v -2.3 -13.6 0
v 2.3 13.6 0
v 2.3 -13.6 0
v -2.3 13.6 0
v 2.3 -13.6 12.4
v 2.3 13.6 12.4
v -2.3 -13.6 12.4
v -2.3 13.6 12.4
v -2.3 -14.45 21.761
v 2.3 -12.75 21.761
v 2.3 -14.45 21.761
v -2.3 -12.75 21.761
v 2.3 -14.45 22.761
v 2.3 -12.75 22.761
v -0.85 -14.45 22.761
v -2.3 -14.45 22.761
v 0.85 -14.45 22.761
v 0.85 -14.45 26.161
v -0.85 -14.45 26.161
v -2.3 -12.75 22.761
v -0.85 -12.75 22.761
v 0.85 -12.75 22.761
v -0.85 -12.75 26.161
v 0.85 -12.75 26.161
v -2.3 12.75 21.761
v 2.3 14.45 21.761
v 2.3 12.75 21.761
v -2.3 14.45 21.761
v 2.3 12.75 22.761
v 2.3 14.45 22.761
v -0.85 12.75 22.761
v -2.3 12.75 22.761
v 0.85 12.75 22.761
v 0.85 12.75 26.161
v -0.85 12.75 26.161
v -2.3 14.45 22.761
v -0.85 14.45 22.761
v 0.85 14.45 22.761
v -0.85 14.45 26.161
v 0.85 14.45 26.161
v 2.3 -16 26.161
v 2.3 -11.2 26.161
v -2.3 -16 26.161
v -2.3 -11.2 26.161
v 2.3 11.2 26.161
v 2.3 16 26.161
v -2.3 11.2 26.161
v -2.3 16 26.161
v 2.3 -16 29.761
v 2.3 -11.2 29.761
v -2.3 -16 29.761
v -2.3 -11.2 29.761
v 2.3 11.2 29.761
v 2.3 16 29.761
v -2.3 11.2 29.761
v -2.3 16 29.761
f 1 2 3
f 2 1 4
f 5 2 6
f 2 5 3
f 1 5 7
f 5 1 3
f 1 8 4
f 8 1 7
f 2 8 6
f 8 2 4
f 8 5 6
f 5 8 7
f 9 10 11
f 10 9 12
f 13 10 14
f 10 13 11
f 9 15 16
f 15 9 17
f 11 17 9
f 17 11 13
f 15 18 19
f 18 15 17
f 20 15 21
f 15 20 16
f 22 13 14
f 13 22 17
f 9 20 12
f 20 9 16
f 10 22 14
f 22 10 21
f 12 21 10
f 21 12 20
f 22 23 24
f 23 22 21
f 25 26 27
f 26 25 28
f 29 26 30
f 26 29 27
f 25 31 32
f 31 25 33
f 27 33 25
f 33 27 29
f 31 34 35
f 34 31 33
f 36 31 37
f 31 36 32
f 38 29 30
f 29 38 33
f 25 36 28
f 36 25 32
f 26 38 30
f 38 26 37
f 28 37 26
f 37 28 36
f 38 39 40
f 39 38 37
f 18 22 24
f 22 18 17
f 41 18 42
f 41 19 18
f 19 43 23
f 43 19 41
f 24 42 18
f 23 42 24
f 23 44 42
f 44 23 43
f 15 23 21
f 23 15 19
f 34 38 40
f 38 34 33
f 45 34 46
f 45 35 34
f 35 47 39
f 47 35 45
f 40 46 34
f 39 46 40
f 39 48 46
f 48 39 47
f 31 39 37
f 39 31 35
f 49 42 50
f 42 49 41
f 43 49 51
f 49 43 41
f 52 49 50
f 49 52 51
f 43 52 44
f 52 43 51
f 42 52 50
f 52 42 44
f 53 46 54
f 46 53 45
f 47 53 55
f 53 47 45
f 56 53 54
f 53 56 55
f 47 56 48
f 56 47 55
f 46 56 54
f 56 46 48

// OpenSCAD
// Generated by SolidPython 0.4.2 on 2020-09-29 23:20:54
//!OpenSCAD

scale(v = 0.0100000000) {
	translate(v = [-230, -1360, 0]) {
		union() {
			color(c = [0.4000000000, 0.4000000000, 0.4000000000]) {
				translate(v = [0, 0, 0]) {
					linear_extrude(height = 1000.0000000000) {
						polygon(paths = [[0, 1, 2, 3]], points = [[0, 0], [0, 2720], [460, 2720], [460, 0]]);
					}
				}
			}
			color(c = [0.2000000000, 0.6000000000, 0.2000000000]) {
				translate(v = [0, 0, 1000.0000000000]) {
					linear_extrude(height = 120.0000000000) {
						polygon(paths = [[0, 1, 2, 3]], points = [[0, 1305], [0, 2720], [460, 2720], [460, 1305]]);
					}
				}
			}
			color(c = [0.4000000000, 0.4000000000, 0.4000000000]) {
				translate(v = [0, 0, 1000.0000000000]) {
					linear_extrude(height = 120.0000000000) {
						polygon(paths = [[0, 1, 2, 3]], points = [[0, 0], [0, 1305], [460, 1305], [460, 0]]);
					}
				}
			}
			color(c = [0.2000000000, 0.6000000000, 0.2000000000]) {
				translate(v = [0, 0, 1120.0000000000]) {
					linear_extrude(height = 120.0000000000) {
						polygon(paths = [[0, 1, 2, 3]], points = [[0, 1305], [0, 2720], [460, 2720], [460, 1305]]);
					}
				}
			}
			color(c = [0.4000000000, 0.4000000000, 0.4000000000]) {
				translate(v = [0, 0, 1120.0000000000]) {
					linear_extrude(height = 120.0000000000) {
						polygon(paths = [[0, 1, 2, 3]], points = [[0, 0], [0, 1305], [460, 1305], [460, 0]]);
					}
				}
			}
			color(c = [0.9000000000, 0.6000000000, 0.6000000000]) {
				translate(v = [0, 0, 2176.1000000000]) {
					linear_extrude(height = 100.0000000000) {
						polygon(paths = [[0, 1, 2, 3]], points = [[0, -85], [0, 85], [460, 85], [460, -85]]);
					}
				}
			}
			color(c = [0.9000000000, 0.6000000000, 0.6000000000]) {
				translate(v = [0, 0, 2176.1000000000]) {
					linear_extrude(height = 100.0000000000) {
						polygon(paths = [[0, 1, 2, 3]], points = [[0, 2635], [0, 2805], [460, 2805], [460, 2635]]);
					}
				}
			}
			color(c = [0.5000000000, 0.5000000000, 0.5000000000]) {
				translate(v = [0, 0, 2276.1000000000]) {
					linear_extrude(height = 340.0000000000) {
						polygon(paths = [[0, 1, 2, 3]], points = [[145, -85], [145, 85], [315, 85], [315, -85]]);
					}
				}
			}
			color(c = [0.5000000000, 0.5000000000, 0.5000000000]) {
				translate(v = [0, 0, 2276.1000000000]) {
					linear_extrude(height = 340.0000000000) {
						polygon(paths = [[0, 1, 2, 3]], points = [[145, 2635], [145, 2805], [315, 2805], [315, 2635]]);
					}
				}
			}
			color(c = [0.3000000000, 0.3000000000, 1]) {
				translate(v = [0, 0, 2616.1000000000]) {
					linear_extrude(height = 360.0000000000) {
						polygon(paths = [[0, 1, 2, 3]], points = [[0, -240], [0, 240], [460, 240], [460, -240]]);
					}
				}
			}
			color(c = [0.3000000000, 0.3000000000, 1]) {
				translate(v = [0, 0, 2616.1000000000]) {
					linear_extrude(height = 360.0000000000) {
						polygon(paths = [[0, 1, 2, 3]], points = [[0, 2480], [0, 2960], [460, 2960], [460, 2480]]);
					}
				}
			}
		}
	}
}
